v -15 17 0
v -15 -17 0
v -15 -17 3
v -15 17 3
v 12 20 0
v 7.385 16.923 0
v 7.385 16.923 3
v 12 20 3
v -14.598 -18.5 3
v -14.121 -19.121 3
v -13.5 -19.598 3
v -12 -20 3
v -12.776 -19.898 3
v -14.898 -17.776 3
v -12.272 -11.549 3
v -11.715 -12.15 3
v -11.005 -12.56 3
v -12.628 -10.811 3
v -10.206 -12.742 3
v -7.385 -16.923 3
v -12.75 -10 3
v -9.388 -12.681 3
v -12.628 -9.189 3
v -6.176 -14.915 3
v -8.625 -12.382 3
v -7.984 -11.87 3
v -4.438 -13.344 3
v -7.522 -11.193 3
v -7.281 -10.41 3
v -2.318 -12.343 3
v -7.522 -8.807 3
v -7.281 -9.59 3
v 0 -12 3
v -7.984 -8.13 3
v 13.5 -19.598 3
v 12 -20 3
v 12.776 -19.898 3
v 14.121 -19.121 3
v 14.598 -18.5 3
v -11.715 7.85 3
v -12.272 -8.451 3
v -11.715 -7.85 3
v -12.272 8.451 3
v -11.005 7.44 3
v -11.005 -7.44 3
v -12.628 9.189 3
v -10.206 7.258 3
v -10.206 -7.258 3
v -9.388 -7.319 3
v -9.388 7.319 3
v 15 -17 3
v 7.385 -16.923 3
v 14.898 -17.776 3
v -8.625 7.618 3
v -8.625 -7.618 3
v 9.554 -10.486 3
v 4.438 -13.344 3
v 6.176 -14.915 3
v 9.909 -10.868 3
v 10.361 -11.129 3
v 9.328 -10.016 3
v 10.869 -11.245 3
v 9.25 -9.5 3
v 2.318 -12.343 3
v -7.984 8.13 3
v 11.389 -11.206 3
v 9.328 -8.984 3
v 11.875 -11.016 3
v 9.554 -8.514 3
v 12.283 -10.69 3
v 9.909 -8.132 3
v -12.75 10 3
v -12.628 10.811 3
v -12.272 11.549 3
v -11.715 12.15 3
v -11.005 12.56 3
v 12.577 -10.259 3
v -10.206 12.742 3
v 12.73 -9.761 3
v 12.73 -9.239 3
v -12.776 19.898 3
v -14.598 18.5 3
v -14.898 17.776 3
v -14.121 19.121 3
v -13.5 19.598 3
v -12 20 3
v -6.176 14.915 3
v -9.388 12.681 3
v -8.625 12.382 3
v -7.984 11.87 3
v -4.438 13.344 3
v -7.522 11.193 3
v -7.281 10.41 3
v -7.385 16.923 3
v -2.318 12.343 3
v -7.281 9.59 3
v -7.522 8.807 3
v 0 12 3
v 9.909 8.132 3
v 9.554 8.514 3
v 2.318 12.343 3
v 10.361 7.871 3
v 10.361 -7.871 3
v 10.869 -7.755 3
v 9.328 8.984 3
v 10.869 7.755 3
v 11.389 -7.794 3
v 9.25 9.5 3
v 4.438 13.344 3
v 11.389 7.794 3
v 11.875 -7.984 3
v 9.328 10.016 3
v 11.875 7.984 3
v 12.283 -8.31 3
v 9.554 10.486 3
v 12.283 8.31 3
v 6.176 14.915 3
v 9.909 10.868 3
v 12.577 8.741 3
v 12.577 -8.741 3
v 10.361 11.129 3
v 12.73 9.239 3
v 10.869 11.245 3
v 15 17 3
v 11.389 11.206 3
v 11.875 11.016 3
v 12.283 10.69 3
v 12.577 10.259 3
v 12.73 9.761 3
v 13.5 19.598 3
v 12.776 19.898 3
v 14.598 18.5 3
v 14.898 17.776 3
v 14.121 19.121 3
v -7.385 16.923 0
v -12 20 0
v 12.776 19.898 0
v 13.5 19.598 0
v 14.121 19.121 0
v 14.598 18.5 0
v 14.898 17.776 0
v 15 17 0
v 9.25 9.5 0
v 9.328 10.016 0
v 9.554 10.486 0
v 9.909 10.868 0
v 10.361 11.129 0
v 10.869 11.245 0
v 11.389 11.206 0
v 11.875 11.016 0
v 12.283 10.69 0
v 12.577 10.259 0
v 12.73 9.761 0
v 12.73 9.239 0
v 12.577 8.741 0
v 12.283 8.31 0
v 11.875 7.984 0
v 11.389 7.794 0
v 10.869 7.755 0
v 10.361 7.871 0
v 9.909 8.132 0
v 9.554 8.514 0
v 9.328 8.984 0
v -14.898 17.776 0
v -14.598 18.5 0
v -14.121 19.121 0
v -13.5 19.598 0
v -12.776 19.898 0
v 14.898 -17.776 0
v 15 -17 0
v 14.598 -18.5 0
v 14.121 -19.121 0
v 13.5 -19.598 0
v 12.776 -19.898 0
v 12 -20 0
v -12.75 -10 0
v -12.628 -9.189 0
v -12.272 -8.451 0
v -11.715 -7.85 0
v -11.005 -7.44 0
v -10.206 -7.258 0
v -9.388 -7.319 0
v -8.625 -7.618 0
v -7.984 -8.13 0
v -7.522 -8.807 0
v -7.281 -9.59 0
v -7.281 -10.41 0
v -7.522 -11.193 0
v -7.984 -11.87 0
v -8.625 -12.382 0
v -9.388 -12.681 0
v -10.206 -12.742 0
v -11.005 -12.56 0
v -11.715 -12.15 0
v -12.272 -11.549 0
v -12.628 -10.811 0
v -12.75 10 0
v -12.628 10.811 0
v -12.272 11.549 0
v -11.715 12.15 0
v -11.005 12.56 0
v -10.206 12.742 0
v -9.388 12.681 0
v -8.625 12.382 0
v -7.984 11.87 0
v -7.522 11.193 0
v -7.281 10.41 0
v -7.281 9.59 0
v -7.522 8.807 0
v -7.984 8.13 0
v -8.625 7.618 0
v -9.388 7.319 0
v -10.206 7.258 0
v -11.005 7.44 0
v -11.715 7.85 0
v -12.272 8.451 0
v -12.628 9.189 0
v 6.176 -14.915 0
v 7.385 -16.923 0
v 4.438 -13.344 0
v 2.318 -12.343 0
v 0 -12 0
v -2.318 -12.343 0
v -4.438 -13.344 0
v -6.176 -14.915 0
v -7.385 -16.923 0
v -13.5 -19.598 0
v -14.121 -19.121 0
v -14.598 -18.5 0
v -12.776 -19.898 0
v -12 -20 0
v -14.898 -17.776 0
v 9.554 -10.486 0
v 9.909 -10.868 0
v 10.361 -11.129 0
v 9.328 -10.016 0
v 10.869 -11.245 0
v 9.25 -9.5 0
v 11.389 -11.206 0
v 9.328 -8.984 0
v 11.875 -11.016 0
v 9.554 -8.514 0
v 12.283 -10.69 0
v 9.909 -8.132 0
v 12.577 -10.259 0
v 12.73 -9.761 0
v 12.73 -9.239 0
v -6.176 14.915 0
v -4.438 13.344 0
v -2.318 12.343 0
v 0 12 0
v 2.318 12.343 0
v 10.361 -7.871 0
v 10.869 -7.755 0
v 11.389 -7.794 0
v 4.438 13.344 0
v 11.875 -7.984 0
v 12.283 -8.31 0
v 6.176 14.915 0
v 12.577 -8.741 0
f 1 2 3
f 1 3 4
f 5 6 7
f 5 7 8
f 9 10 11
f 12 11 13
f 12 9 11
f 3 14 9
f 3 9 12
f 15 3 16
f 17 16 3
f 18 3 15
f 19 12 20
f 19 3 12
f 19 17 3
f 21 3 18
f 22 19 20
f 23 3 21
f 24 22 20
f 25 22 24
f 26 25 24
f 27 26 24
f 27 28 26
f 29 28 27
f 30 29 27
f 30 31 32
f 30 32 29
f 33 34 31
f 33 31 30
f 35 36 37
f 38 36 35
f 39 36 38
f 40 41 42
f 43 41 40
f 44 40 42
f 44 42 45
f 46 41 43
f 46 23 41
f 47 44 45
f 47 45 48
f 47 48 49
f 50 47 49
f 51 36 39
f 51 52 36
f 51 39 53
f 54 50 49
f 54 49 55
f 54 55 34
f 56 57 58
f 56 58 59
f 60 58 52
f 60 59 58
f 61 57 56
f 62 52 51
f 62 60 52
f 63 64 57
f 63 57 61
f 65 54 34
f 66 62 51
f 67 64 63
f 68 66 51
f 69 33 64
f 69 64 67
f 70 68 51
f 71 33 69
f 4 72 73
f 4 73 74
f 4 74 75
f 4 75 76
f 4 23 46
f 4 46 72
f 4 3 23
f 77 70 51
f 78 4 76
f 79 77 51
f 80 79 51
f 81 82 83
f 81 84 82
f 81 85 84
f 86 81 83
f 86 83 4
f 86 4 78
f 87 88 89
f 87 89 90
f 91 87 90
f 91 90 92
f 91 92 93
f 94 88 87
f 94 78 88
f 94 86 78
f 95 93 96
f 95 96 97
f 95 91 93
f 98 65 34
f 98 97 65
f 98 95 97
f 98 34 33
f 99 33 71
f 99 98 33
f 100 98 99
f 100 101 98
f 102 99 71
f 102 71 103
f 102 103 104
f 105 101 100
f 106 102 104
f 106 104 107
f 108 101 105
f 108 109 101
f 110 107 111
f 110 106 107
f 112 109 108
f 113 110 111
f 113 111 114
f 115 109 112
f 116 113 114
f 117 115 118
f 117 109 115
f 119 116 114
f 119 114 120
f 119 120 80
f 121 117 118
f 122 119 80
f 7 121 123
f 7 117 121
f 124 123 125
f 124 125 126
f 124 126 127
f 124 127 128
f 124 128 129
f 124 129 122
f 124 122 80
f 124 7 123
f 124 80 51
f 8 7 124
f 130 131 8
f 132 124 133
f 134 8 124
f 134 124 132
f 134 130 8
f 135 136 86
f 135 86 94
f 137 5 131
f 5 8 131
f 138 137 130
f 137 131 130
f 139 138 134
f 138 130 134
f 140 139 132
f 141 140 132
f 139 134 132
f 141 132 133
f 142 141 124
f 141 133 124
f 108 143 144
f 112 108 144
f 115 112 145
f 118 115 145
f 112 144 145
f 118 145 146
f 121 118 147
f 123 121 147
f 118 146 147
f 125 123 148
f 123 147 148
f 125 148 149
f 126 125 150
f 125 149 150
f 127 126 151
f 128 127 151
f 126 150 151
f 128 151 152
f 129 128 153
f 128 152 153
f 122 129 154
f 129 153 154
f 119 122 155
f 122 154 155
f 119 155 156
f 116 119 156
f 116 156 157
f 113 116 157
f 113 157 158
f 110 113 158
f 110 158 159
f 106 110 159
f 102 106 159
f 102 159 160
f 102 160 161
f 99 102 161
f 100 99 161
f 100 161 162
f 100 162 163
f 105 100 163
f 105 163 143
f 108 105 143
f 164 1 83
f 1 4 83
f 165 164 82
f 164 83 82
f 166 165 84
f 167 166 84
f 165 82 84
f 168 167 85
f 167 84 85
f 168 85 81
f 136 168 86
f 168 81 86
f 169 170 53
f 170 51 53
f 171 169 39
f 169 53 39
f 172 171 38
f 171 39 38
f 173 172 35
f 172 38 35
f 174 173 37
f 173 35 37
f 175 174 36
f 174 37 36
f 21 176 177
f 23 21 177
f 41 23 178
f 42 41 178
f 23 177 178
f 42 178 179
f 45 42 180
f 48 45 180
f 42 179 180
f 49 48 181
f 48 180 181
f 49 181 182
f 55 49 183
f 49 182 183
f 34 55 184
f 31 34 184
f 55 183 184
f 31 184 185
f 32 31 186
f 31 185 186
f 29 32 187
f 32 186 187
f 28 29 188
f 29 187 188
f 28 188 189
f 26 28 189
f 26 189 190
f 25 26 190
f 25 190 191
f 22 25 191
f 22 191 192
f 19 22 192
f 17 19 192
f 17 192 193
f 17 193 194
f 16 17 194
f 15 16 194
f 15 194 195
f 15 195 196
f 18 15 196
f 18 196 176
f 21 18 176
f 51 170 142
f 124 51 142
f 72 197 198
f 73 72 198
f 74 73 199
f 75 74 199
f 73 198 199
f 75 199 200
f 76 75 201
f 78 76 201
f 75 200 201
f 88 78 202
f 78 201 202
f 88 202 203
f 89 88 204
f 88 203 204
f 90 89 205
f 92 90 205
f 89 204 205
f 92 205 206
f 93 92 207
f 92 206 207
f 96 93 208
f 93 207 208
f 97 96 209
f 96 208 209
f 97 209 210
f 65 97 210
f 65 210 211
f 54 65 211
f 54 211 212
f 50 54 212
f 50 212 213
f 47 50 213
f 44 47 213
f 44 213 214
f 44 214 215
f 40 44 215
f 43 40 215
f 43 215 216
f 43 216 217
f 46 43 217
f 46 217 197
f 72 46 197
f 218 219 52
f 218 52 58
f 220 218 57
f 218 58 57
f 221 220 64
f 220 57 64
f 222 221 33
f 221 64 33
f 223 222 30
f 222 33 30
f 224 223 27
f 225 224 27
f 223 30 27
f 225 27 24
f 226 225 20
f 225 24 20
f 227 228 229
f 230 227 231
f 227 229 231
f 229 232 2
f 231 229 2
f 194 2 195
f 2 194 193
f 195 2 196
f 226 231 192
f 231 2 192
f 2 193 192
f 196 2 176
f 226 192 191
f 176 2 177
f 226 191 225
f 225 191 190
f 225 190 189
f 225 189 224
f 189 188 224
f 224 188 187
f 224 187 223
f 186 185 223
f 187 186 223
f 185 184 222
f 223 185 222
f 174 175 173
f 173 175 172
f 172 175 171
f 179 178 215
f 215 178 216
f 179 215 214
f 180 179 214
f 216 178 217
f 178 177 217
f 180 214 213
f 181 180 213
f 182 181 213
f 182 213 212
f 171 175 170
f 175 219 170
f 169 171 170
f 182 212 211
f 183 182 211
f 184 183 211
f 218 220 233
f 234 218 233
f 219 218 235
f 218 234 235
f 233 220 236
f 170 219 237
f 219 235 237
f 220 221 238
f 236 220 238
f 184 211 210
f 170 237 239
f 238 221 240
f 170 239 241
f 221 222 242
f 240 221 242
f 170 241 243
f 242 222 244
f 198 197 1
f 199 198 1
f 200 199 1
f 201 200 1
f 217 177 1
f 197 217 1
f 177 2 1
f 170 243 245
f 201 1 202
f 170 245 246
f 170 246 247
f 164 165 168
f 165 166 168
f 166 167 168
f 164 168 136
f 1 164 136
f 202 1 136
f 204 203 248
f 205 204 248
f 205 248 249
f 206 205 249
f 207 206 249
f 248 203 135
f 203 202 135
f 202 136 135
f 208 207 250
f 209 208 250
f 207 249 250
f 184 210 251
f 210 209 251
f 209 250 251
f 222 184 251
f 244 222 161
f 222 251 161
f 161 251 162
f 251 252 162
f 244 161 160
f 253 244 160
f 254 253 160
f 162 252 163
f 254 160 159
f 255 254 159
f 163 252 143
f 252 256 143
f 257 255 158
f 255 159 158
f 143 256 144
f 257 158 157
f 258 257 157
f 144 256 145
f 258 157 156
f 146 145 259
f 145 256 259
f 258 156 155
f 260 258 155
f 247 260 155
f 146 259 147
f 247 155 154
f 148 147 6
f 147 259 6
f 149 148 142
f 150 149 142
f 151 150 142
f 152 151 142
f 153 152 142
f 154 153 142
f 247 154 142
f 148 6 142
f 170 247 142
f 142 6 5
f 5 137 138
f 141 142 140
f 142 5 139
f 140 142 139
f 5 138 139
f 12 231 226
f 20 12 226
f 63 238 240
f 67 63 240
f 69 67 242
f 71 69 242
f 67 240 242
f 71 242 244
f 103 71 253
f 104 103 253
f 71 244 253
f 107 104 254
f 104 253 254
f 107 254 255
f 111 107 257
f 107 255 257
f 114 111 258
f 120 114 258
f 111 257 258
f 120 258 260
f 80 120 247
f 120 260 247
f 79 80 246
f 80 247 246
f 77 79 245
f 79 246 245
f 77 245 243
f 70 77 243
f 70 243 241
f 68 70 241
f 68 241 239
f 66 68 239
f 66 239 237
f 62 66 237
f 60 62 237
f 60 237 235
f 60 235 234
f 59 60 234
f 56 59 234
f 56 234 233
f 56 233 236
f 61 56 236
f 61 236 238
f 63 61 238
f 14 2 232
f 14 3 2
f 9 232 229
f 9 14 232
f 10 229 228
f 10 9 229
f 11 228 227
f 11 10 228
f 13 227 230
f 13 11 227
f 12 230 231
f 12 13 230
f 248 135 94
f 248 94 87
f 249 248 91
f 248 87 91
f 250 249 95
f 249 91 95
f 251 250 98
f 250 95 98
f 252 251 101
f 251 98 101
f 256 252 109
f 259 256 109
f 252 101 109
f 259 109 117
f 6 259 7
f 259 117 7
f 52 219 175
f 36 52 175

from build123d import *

# Parameters (mm, degrees)
F5_W        = 30
F5_H        = 40
F6_DEPTH    = 3
F8_D        = 5.5
F9_D        = 3.5
F1_DEPTH    = 25
F2_R        = 3
F3_T1_DEPTH = 23.839434056
F4_T1_DEPTH = 23.839434056


# Not quite as in the source:
# - a fillet or chamfer that OpenCascade refuses, or shapes differently, is made with other operations: its cross-section is extruded or revolved along the edge and cut away or added


with BuildPart() as f6:
    # F5 (on Top) → F6 (new body)
    with BuildSketch(Plane.XY):
        Rectangle(F5_W, F5_H)
    extrude(amount=F6_DEPTH)

    # F8 (through all)
    with Locations(Plane.XY.offset(3)):
        with Locations((-10, 10), (-10, -10)):
            Hole(F8_D / 2)

    # F9 (through all)
    with Locations(Plane.XY.offset(3)):
        with Locations((11, 9.5), (11, -9.5)):
            Hole(F9_D / 2)

    # F0 (on face) → F1 (cut)
    with BuildSketch(Plane.XY.offset(3)):
        with BuildLine():
            Line((-8, -20), (8, -20))
            ThreePointArc((8, -20), (0, -12), (-8, -20))
        make_face()
        with BuildLine():
            ThreePointArc((-8, 20), (0, 12), (8, 20))
            Line((8, 20), (-8, 20))
        make_face()
    extrude(amount=-F1_DEPTH, mode=Mode.SUBTRACT)

    # F2
    f2_edges = [f6.edges().sort_by_distance(p)[0] for p in [
        (15, -20, 1.5),
        (-15, -20, 1.5),
        (15, 20, 1.5),
        (-15, 20, 1.5),
    ]]
    fillet(f2_edges, radius=F2_R)

    # F3: chamfer of 5 on 2 edges, made by hand

    # F3_s2 → F3_t1 (cut)
    with BuildSketch(Plane.XY.offset(-10.419717028)):
        with BuildLine():
            Line((-12, 20), (-7.3846153846, 16.9230769231))
            ThreePointArc((-7.3846153846, 16.9230769231), (-7.8300507328, 18.3597849159), (-8, 20))
            Line((-8, 20), (-12, 20))
        make_face()
        with BuildLine():
            Line((7.3846153846, 16.9230769231), (12, 20))
            Line((12, 20), (8, 20))
            ThreePointArc((8, 20), (7.8300507328, 18.3597849159), (7.3846153846, 16.9230769231))
        make_face()
    extrude(amount=F3_T1_DEPTH, mode=Mode.SUBTRACT)

    # F4: chamfer of 5 on 2 edges, made by hand

    # F4_s2 → F4_t1 (cut)
    with BuildSketch(Plane.XY.offset(-10.419717028)):
        with BuildLine():
            Line((7.3846153846, -16.9230769231), (12, -20))
            Line((12, -20), (8, -20))
            ThreePointArc((8, -20), (7.8300507328, -18.3597849159), (7.3846153846, -16.9230769231))
        make_face()
        with BuildLine():
            Line((-12, -20), (-7.3846153846, -16.9230769231))
            ThreePointArc((-7.3846153846, -16.9230769231), (-7.8300507328, -18.3597849159), (-8, -20))
            Line((-8, -20), (-12, -20))
        make_face()
    extrude(amount=F4_T1_DEPTH, mode=Mode.SUBTRACT)


solid = f6.part
